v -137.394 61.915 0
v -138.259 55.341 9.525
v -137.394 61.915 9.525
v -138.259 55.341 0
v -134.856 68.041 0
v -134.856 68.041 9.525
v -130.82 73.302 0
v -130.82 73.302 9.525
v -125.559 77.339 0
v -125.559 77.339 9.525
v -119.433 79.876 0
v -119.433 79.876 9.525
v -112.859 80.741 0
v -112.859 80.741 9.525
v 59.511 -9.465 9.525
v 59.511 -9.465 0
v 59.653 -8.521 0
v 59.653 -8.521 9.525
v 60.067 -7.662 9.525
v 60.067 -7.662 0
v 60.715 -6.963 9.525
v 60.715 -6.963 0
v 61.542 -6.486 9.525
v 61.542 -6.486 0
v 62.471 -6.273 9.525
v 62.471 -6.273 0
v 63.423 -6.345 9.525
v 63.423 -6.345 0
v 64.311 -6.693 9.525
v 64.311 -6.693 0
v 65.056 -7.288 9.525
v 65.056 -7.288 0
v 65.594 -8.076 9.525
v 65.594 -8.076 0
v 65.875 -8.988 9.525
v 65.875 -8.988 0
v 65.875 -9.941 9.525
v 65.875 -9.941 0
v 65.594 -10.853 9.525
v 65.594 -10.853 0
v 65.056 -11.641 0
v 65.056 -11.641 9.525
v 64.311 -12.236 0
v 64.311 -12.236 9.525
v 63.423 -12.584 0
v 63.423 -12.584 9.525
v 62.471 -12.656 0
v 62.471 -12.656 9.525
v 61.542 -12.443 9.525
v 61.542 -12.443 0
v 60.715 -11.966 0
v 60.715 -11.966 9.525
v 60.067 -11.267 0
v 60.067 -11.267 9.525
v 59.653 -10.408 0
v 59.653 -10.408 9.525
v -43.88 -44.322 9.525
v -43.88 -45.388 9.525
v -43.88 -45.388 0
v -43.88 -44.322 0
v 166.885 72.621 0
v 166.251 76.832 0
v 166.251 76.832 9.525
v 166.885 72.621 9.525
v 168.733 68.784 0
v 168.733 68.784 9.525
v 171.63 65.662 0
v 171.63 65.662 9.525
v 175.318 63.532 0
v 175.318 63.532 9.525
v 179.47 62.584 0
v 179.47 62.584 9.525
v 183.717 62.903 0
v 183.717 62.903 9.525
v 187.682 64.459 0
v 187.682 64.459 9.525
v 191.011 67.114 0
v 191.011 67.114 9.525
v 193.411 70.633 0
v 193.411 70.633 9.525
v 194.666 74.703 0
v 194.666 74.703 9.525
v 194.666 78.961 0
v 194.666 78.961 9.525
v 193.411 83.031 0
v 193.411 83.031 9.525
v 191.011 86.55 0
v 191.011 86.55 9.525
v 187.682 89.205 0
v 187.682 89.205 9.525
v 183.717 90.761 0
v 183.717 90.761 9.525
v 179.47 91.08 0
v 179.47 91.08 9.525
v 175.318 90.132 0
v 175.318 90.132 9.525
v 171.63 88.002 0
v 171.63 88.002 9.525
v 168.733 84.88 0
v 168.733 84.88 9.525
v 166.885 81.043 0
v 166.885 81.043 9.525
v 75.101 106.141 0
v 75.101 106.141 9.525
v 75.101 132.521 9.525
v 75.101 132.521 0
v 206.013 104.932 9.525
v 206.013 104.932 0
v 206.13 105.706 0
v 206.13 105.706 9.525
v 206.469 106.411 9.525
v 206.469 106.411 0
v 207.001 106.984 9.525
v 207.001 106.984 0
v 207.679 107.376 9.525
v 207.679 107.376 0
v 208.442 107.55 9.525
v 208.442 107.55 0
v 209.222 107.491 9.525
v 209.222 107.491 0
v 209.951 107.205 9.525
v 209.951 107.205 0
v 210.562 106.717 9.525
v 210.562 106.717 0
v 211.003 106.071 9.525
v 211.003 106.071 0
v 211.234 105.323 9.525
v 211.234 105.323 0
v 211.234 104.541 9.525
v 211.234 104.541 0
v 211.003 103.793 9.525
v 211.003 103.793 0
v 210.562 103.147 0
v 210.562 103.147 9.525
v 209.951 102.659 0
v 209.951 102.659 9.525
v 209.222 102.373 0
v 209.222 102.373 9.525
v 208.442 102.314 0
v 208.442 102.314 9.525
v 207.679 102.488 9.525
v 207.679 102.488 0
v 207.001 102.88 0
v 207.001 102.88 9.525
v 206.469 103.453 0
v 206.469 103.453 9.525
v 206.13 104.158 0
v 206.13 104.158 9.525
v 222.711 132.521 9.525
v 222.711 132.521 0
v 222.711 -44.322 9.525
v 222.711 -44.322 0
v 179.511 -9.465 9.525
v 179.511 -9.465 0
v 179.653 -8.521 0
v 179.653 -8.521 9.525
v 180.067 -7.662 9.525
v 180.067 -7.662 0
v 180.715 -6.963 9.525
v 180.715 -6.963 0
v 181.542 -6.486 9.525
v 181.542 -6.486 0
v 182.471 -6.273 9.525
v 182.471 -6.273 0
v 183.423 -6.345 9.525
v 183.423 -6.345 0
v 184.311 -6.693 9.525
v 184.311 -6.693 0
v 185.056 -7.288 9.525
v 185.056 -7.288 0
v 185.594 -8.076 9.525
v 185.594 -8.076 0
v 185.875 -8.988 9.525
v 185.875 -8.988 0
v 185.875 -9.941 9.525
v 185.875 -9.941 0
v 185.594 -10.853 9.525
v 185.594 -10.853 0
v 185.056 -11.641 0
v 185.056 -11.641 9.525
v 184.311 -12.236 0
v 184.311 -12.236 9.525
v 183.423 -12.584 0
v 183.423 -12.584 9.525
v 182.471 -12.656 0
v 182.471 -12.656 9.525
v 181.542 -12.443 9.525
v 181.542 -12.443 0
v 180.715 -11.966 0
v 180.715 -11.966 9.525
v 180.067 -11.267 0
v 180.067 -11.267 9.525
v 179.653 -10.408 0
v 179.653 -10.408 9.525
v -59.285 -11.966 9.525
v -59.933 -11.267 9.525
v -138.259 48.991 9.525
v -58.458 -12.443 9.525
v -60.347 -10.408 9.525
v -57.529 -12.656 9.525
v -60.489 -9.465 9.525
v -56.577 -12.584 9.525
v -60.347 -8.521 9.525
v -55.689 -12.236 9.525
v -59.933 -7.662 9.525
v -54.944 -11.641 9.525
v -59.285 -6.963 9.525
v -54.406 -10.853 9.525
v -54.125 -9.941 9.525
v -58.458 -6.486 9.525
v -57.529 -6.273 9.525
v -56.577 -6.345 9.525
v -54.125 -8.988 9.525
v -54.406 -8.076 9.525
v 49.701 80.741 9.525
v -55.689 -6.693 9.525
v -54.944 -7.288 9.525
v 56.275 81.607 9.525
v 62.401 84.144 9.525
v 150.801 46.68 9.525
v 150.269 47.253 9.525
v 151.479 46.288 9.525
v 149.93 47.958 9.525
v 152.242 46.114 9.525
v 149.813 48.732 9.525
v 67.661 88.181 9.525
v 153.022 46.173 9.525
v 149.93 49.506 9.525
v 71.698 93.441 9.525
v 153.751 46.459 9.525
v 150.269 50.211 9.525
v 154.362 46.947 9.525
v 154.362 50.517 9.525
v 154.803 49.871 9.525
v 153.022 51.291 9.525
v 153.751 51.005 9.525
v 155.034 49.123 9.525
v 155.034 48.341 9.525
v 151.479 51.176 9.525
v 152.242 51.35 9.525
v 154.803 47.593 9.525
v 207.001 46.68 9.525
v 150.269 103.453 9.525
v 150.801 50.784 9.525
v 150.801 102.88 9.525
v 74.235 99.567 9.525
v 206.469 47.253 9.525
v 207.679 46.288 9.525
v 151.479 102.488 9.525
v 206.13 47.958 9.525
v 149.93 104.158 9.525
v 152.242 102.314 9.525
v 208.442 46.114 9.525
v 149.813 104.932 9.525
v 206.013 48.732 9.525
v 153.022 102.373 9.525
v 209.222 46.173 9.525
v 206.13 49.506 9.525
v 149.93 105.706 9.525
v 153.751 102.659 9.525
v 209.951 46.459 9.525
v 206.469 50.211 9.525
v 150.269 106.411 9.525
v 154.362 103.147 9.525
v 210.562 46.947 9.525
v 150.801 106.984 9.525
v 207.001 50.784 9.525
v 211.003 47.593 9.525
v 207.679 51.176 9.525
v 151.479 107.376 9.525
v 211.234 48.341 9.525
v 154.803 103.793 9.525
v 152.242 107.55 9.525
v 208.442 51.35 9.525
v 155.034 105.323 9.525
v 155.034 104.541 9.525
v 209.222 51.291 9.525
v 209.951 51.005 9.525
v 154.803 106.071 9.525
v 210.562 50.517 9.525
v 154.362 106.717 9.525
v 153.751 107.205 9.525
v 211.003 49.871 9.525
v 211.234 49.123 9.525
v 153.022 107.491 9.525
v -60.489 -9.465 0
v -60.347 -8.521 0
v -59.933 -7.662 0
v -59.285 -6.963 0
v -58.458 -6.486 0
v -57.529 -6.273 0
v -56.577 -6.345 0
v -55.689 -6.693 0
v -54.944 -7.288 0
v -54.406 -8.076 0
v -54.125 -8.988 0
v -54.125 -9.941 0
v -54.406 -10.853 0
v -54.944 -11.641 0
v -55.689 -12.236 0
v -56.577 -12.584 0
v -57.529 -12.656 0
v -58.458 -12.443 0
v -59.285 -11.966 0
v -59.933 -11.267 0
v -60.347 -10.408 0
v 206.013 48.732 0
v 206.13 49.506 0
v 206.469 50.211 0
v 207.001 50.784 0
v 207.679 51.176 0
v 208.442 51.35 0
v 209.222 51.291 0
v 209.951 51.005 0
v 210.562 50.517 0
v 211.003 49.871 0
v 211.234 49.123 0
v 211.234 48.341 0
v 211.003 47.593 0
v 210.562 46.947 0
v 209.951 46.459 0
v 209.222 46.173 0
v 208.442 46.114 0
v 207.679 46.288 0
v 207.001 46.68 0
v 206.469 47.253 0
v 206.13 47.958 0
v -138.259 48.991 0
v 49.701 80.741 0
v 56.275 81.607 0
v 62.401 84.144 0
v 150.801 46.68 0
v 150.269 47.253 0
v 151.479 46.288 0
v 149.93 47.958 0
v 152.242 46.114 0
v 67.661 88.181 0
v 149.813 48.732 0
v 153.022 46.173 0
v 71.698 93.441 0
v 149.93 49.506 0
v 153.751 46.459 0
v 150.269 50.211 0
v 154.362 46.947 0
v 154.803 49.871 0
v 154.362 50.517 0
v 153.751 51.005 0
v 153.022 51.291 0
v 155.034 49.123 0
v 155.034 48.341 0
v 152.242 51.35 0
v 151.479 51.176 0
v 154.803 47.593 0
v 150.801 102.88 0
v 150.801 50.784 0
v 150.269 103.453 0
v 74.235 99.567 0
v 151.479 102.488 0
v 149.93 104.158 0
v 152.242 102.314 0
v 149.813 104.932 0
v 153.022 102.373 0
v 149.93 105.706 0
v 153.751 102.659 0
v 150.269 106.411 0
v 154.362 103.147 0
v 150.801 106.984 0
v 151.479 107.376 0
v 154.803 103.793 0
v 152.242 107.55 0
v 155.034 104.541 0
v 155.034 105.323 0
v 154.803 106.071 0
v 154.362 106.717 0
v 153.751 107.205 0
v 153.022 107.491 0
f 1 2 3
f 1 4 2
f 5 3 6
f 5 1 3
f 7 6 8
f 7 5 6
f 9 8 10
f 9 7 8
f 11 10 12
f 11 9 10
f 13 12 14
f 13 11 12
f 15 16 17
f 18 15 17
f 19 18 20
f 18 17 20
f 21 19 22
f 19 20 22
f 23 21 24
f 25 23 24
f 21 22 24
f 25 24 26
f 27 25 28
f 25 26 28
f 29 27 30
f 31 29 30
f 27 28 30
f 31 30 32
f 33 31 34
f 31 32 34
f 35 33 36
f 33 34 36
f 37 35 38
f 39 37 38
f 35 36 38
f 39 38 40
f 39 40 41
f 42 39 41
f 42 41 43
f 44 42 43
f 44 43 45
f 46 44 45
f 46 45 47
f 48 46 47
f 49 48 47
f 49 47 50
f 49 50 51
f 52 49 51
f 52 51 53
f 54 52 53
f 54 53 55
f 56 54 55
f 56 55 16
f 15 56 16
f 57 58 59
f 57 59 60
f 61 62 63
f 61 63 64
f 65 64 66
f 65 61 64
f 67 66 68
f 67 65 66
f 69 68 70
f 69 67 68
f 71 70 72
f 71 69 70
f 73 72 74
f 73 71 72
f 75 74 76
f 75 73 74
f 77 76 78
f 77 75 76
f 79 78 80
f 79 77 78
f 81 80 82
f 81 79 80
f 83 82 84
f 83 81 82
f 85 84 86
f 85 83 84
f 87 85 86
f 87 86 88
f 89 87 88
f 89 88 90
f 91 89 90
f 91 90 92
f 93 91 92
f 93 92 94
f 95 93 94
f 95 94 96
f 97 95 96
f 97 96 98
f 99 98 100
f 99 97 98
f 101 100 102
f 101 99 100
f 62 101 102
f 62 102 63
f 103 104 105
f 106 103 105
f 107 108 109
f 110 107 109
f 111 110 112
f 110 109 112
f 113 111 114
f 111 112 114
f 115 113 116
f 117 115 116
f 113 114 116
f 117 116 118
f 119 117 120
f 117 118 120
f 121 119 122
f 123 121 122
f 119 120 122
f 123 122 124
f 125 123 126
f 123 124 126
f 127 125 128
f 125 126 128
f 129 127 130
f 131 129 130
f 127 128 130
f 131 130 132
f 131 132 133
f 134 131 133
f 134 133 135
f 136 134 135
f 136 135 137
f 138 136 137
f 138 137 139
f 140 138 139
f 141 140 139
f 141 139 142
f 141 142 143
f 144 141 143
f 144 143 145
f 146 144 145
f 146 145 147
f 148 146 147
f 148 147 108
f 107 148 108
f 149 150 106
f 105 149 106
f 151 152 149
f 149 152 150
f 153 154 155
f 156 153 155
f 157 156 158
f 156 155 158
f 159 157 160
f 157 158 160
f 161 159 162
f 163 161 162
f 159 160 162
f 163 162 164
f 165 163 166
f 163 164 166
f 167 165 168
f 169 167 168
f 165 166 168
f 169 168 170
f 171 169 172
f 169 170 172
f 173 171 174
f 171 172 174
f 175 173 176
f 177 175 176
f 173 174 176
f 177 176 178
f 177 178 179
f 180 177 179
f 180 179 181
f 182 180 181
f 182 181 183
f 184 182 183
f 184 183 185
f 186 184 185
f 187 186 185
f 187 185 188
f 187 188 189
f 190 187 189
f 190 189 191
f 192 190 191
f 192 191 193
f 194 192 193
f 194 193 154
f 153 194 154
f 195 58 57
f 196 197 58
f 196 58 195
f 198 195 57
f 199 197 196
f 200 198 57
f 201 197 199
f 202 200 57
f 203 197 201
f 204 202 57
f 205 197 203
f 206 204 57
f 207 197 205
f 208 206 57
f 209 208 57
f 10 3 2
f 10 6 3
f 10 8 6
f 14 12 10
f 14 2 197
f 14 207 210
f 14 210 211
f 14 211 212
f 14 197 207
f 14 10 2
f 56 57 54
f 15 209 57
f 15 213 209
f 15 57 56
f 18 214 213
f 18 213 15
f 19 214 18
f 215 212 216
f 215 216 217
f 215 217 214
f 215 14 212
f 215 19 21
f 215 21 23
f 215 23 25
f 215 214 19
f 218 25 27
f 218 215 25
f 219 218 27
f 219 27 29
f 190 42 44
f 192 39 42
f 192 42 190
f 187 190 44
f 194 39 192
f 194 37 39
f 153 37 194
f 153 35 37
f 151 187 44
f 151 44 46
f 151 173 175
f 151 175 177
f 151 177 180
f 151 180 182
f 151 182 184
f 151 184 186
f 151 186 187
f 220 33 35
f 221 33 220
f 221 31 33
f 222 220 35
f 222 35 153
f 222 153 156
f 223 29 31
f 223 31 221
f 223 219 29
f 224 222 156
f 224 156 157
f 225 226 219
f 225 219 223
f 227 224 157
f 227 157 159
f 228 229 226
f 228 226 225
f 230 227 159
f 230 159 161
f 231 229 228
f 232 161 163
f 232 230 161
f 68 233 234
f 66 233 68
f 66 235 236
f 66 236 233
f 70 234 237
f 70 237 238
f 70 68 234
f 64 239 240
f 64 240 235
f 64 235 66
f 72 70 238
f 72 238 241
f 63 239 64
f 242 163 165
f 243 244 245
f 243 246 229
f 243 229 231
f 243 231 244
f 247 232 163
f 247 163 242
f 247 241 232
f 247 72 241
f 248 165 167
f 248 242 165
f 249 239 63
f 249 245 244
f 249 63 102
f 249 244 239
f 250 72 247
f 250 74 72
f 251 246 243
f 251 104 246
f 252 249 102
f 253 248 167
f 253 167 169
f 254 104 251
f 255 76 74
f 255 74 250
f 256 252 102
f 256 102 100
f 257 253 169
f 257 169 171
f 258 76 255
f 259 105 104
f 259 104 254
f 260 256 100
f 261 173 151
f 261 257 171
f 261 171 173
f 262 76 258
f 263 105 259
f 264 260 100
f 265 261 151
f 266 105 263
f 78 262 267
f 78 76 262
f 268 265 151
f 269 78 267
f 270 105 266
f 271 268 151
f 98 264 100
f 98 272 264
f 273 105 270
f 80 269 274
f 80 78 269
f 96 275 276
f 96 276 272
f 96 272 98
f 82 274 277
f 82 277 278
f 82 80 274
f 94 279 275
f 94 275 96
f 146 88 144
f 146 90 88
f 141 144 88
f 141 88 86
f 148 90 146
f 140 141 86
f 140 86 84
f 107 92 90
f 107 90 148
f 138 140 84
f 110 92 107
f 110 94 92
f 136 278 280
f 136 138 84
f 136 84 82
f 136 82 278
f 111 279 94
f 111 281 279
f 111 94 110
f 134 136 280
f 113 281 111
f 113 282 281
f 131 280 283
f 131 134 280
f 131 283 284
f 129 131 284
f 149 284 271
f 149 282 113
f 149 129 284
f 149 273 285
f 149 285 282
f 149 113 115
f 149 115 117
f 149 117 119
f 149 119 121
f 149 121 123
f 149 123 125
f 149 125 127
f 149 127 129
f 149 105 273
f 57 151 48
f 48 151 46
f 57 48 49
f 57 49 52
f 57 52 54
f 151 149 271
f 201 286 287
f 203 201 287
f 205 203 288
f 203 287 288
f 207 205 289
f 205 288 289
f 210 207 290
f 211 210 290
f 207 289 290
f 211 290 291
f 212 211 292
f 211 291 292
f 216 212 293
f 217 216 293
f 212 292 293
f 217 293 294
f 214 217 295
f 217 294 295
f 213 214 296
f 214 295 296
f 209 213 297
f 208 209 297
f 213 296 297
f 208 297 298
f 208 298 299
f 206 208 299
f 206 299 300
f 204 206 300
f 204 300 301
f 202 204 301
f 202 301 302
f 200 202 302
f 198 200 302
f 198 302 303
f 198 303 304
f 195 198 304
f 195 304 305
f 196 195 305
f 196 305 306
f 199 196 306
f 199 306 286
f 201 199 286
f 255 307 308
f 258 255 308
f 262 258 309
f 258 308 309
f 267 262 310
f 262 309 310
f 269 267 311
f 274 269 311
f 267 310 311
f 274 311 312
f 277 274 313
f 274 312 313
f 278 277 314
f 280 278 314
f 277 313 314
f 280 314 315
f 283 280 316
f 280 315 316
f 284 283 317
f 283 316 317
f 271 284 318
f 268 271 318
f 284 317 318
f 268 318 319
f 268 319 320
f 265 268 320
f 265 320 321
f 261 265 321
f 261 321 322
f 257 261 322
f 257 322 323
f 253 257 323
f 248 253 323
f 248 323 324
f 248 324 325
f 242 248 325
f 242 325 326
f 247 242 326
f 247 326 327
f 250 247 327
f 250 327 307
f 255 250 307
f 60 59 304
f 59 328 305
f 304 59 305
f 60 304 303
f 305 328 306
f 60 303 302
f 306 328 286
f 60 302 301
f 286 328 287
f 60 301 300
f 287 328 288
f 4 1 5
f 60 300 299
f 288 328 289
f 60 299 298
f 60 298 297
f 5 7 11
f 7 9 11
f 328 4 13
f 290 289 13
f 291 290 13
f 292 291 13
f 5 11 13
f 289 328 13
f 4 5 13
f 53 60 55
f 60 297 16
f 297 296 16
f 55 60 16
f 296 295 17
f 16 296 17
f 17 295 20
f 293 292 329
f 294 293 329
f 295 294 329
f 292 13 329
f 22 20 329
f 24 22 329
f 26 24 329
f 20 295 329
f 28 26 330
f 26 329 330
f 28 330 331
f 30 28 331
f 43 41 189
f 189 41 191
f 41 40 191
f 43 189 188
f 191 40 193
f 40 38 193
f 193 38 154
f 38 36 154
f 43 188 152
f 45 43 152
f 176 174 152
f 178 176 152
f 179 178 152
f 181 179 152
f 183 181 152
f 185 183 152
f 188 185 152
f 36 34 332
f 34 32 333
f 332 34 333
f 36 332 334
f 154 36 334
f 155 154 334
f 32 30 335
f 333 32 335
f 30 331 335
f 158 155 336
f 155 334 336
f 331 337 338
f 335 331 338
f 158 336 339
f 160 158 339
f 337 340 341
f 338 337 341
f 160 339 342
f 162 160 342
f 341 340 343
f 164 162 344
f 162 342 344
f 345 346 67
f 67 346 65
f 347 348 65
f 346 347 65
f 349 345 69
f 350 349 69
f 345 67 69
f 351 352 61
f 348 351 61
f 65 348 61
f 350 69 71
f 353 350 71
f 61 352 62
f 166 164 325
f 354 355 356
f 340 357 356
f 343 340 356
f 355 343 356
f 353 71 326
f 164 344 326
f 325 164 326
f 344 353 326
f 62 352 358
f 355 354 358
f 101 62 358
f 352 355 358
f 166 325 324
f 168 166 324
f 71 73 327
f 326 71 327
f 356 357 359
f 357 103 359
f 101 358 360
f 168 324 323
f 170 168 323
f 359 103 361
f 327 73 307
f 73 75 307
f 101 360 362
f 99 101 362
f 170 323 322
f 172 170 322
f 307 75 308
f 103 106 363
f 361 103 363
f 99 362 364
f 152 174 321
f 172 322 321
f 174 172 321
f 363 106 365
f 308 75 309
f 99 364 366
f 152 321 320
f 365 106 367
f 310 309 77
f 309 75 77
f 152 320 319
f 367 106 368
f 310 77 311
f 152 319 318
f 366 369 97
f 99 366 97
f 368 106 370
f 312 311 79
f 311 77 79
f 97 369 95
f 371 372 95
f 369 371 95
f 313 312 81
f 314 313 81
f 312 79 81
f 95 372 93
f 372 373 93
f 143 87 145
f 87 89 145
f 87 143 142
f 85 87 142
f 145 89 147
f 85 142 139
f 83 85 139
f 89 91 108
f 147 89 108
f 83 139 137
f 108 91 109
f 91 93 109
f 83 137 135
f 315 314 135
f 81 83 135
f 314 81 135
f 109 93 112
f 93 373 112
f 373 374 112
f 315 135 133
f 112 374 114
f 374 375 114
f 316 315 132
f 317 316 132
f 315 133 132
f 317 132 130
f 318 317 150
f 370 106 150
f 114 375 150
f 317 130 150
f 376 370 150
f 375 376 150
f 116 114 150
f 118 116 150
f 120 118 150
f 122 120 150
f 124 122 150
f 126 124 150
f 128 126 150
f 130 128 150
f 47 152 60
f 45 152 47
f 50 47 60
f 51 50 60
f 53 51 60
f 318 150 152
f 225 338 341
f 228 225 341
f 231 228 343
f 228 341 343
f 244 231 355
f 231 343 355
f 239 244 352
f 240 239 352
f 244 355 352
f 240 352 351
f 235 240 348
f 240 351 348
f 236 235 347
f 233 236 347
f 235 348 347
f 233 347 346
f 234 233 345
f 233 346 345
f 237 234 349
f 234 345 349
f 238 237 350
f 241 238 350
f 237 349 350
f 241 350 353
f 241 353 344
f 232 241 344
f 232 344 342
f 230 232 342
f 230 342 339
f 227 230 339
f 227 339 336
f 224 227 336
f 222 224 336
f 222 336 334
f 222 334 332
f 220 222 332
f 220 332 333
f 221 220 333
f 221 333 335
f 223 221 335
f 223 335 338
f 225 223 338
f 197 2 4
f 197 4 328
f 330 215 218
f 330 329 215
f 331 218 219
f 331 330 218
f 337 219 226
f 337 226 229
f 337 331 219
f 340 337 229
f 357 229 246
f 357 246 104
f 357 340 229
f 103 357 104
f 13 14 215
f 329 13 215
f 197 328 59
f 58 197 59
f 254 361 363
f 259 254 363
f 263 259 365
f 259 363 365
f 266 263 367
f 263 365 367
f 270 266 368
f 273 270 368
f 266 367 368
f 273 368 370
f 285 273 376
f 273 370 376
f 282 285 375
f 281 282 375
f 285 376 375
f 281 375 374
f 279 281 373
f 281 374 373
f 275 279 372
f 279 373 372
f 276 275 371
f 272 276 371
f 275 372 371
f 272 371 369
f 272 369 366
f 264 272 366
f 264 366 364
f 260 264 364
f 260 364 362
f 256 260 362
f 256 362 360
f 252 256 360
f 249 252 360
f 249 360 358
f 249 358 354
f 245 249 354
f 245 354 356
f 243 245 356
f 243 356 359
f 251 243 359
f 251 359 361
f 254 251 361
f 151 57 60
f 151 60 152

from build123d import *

# Parameters (mm, degrees)
SKETCH1_R                    = 14.2875
BOSS_EXTRUDE1_DEPTH          = 9.525
SKETCH2_W                    = 285.640227578
SKETCH2_H                    = 77.156349518
CUT_EXTRUDE1_DEPTH           = 267.58430025
SKETCH4_W                    = 213.36
SKETCH4_H                    = 65.465352004
CUT_EXTRUDE2_DEPTH           = 267.58430025
FILLET2_R                    = 25.4
SKETCH16_W                   = 9.525
SKETCH16_H                   = 0.985363282
CUT_EXTRUDE3_DEPTH           = 390.572219806
SKETCH17_W                   = 147.610011278
SKETCH17_H                   = 12.7
CUT_EXTRUDE4_DEPTH           = 267.045158533
TAP_DRILL_FOR_M6X0_75_TAP1_D = 5.25
F_6_4_6_4_DIAMETER_HOLE1_D   = 6.4


with BuildPart() as part:
    # Sketch1 → Boss-Extrude1 (new body)
    with BuildSketch(Plane.XY):
        Polygon((-138.259383474, 48.991487021), (32.210627804, -121.478524257), (222.710627804, -121.478524257), (222.710627804, 146.206839025), (-138.259383474, 146.206839025), align=None)
        with Locations(Location((180.538014078, 76.831975743, 0), (0, 0, 180))):
            Circle(SKETCH1_R, mode=Mode.SUBTRACT)
    extrude(amount=BOSS_EXTRUDE1_DEPTH)

    # Sketch2 → Cut-Extrude1 (cut, through all)
    with BuildSketch(Plane.XY.offset(9.525)):
        with Locations((98.940514015, -82.900349498)):
            Rectangle(SKETCH2_W, SKETCH2_H)
    extrude(amount=-CUT_EXTRUDE1_DEPTH, mode=Mode.SUBTRACT)

    # Sketch4 → Cut-Extrude2 (cut, through all)
    with BuildSketch(Plane.XY.offset(9.525)):
        with Locations((-31.579383474, 113.474163023)):
            Rectangle(SKETCH4_W, SKETCH4_H)
    extrude(amount=-CUT_EXTRUDE2_DEPTH, mode=Mode.SUBTRACT)

    # Fillet2
    fillet2_edges = [part.edges().sort_by_distance(p)[0] for p in [
        (-138.259383474, 80.741487021, 4.7625),
        (75.100616526, 80.741487021, 4.7625),
    ]]
    fillet(fillet2_edges, radius=FILLET2_R)

    # Sketch16 → Cut-Extrude3 (cut, through all)
    with BuildSketch(Plane(origin=(222.710627804, 0, 0), x_dir=(0, 0, -1), z_dir=(1, 0, 0))):
        with Locations((-4.7625, 145.714157384)):
            Rectangle(SKETCH16_W, SKETCH16_H)
    extrude(amount=-CUT_EXTRUDE3_DEPTH, mode=Mode.SUBTRACT)

    # Sketch17 → Cut-Extrude4 (cut, through all)
    with BuildSketch(Plane(origin=(0, 0, 0), x_dir=(-1, 0, 0), z_dir=(0, 0, -1))):
        with Locations((-148.905622165, 138.871475743)):
            Rectangle(SKETCH17_W, SKETCH17_H)
    extrude(amount=-CUT_EXTRUDE4_DEPTH, mode=Mode.SUBTRACT)

    # Tap Drill for M6x0.75 Tap1 (through all)
    with Locations(Plane.XY.offset(9.525)):
        with Locations((208.638014078, 104.931975743), (152.438014078, 104.931975743), (152.438014078, 48.731975743), (208.638014078, 48.731975743)):
            Hole(TAP_DRILL_FOR_M6X0_75_TAP1_D / 2)

    # Ø6.4 (6.4) Diameter Hole1 (through all)
    with Locations(Plane.XY.offset(9.525)):
        with Locations((-57.289372206, -9.464524257), (62.710627794, -9.464524257), (182.710627794, -9.464524257)):
            Hole(F_6_4_6_4_DIAMETER_HOLE1_D / 2)


solid = part.part
